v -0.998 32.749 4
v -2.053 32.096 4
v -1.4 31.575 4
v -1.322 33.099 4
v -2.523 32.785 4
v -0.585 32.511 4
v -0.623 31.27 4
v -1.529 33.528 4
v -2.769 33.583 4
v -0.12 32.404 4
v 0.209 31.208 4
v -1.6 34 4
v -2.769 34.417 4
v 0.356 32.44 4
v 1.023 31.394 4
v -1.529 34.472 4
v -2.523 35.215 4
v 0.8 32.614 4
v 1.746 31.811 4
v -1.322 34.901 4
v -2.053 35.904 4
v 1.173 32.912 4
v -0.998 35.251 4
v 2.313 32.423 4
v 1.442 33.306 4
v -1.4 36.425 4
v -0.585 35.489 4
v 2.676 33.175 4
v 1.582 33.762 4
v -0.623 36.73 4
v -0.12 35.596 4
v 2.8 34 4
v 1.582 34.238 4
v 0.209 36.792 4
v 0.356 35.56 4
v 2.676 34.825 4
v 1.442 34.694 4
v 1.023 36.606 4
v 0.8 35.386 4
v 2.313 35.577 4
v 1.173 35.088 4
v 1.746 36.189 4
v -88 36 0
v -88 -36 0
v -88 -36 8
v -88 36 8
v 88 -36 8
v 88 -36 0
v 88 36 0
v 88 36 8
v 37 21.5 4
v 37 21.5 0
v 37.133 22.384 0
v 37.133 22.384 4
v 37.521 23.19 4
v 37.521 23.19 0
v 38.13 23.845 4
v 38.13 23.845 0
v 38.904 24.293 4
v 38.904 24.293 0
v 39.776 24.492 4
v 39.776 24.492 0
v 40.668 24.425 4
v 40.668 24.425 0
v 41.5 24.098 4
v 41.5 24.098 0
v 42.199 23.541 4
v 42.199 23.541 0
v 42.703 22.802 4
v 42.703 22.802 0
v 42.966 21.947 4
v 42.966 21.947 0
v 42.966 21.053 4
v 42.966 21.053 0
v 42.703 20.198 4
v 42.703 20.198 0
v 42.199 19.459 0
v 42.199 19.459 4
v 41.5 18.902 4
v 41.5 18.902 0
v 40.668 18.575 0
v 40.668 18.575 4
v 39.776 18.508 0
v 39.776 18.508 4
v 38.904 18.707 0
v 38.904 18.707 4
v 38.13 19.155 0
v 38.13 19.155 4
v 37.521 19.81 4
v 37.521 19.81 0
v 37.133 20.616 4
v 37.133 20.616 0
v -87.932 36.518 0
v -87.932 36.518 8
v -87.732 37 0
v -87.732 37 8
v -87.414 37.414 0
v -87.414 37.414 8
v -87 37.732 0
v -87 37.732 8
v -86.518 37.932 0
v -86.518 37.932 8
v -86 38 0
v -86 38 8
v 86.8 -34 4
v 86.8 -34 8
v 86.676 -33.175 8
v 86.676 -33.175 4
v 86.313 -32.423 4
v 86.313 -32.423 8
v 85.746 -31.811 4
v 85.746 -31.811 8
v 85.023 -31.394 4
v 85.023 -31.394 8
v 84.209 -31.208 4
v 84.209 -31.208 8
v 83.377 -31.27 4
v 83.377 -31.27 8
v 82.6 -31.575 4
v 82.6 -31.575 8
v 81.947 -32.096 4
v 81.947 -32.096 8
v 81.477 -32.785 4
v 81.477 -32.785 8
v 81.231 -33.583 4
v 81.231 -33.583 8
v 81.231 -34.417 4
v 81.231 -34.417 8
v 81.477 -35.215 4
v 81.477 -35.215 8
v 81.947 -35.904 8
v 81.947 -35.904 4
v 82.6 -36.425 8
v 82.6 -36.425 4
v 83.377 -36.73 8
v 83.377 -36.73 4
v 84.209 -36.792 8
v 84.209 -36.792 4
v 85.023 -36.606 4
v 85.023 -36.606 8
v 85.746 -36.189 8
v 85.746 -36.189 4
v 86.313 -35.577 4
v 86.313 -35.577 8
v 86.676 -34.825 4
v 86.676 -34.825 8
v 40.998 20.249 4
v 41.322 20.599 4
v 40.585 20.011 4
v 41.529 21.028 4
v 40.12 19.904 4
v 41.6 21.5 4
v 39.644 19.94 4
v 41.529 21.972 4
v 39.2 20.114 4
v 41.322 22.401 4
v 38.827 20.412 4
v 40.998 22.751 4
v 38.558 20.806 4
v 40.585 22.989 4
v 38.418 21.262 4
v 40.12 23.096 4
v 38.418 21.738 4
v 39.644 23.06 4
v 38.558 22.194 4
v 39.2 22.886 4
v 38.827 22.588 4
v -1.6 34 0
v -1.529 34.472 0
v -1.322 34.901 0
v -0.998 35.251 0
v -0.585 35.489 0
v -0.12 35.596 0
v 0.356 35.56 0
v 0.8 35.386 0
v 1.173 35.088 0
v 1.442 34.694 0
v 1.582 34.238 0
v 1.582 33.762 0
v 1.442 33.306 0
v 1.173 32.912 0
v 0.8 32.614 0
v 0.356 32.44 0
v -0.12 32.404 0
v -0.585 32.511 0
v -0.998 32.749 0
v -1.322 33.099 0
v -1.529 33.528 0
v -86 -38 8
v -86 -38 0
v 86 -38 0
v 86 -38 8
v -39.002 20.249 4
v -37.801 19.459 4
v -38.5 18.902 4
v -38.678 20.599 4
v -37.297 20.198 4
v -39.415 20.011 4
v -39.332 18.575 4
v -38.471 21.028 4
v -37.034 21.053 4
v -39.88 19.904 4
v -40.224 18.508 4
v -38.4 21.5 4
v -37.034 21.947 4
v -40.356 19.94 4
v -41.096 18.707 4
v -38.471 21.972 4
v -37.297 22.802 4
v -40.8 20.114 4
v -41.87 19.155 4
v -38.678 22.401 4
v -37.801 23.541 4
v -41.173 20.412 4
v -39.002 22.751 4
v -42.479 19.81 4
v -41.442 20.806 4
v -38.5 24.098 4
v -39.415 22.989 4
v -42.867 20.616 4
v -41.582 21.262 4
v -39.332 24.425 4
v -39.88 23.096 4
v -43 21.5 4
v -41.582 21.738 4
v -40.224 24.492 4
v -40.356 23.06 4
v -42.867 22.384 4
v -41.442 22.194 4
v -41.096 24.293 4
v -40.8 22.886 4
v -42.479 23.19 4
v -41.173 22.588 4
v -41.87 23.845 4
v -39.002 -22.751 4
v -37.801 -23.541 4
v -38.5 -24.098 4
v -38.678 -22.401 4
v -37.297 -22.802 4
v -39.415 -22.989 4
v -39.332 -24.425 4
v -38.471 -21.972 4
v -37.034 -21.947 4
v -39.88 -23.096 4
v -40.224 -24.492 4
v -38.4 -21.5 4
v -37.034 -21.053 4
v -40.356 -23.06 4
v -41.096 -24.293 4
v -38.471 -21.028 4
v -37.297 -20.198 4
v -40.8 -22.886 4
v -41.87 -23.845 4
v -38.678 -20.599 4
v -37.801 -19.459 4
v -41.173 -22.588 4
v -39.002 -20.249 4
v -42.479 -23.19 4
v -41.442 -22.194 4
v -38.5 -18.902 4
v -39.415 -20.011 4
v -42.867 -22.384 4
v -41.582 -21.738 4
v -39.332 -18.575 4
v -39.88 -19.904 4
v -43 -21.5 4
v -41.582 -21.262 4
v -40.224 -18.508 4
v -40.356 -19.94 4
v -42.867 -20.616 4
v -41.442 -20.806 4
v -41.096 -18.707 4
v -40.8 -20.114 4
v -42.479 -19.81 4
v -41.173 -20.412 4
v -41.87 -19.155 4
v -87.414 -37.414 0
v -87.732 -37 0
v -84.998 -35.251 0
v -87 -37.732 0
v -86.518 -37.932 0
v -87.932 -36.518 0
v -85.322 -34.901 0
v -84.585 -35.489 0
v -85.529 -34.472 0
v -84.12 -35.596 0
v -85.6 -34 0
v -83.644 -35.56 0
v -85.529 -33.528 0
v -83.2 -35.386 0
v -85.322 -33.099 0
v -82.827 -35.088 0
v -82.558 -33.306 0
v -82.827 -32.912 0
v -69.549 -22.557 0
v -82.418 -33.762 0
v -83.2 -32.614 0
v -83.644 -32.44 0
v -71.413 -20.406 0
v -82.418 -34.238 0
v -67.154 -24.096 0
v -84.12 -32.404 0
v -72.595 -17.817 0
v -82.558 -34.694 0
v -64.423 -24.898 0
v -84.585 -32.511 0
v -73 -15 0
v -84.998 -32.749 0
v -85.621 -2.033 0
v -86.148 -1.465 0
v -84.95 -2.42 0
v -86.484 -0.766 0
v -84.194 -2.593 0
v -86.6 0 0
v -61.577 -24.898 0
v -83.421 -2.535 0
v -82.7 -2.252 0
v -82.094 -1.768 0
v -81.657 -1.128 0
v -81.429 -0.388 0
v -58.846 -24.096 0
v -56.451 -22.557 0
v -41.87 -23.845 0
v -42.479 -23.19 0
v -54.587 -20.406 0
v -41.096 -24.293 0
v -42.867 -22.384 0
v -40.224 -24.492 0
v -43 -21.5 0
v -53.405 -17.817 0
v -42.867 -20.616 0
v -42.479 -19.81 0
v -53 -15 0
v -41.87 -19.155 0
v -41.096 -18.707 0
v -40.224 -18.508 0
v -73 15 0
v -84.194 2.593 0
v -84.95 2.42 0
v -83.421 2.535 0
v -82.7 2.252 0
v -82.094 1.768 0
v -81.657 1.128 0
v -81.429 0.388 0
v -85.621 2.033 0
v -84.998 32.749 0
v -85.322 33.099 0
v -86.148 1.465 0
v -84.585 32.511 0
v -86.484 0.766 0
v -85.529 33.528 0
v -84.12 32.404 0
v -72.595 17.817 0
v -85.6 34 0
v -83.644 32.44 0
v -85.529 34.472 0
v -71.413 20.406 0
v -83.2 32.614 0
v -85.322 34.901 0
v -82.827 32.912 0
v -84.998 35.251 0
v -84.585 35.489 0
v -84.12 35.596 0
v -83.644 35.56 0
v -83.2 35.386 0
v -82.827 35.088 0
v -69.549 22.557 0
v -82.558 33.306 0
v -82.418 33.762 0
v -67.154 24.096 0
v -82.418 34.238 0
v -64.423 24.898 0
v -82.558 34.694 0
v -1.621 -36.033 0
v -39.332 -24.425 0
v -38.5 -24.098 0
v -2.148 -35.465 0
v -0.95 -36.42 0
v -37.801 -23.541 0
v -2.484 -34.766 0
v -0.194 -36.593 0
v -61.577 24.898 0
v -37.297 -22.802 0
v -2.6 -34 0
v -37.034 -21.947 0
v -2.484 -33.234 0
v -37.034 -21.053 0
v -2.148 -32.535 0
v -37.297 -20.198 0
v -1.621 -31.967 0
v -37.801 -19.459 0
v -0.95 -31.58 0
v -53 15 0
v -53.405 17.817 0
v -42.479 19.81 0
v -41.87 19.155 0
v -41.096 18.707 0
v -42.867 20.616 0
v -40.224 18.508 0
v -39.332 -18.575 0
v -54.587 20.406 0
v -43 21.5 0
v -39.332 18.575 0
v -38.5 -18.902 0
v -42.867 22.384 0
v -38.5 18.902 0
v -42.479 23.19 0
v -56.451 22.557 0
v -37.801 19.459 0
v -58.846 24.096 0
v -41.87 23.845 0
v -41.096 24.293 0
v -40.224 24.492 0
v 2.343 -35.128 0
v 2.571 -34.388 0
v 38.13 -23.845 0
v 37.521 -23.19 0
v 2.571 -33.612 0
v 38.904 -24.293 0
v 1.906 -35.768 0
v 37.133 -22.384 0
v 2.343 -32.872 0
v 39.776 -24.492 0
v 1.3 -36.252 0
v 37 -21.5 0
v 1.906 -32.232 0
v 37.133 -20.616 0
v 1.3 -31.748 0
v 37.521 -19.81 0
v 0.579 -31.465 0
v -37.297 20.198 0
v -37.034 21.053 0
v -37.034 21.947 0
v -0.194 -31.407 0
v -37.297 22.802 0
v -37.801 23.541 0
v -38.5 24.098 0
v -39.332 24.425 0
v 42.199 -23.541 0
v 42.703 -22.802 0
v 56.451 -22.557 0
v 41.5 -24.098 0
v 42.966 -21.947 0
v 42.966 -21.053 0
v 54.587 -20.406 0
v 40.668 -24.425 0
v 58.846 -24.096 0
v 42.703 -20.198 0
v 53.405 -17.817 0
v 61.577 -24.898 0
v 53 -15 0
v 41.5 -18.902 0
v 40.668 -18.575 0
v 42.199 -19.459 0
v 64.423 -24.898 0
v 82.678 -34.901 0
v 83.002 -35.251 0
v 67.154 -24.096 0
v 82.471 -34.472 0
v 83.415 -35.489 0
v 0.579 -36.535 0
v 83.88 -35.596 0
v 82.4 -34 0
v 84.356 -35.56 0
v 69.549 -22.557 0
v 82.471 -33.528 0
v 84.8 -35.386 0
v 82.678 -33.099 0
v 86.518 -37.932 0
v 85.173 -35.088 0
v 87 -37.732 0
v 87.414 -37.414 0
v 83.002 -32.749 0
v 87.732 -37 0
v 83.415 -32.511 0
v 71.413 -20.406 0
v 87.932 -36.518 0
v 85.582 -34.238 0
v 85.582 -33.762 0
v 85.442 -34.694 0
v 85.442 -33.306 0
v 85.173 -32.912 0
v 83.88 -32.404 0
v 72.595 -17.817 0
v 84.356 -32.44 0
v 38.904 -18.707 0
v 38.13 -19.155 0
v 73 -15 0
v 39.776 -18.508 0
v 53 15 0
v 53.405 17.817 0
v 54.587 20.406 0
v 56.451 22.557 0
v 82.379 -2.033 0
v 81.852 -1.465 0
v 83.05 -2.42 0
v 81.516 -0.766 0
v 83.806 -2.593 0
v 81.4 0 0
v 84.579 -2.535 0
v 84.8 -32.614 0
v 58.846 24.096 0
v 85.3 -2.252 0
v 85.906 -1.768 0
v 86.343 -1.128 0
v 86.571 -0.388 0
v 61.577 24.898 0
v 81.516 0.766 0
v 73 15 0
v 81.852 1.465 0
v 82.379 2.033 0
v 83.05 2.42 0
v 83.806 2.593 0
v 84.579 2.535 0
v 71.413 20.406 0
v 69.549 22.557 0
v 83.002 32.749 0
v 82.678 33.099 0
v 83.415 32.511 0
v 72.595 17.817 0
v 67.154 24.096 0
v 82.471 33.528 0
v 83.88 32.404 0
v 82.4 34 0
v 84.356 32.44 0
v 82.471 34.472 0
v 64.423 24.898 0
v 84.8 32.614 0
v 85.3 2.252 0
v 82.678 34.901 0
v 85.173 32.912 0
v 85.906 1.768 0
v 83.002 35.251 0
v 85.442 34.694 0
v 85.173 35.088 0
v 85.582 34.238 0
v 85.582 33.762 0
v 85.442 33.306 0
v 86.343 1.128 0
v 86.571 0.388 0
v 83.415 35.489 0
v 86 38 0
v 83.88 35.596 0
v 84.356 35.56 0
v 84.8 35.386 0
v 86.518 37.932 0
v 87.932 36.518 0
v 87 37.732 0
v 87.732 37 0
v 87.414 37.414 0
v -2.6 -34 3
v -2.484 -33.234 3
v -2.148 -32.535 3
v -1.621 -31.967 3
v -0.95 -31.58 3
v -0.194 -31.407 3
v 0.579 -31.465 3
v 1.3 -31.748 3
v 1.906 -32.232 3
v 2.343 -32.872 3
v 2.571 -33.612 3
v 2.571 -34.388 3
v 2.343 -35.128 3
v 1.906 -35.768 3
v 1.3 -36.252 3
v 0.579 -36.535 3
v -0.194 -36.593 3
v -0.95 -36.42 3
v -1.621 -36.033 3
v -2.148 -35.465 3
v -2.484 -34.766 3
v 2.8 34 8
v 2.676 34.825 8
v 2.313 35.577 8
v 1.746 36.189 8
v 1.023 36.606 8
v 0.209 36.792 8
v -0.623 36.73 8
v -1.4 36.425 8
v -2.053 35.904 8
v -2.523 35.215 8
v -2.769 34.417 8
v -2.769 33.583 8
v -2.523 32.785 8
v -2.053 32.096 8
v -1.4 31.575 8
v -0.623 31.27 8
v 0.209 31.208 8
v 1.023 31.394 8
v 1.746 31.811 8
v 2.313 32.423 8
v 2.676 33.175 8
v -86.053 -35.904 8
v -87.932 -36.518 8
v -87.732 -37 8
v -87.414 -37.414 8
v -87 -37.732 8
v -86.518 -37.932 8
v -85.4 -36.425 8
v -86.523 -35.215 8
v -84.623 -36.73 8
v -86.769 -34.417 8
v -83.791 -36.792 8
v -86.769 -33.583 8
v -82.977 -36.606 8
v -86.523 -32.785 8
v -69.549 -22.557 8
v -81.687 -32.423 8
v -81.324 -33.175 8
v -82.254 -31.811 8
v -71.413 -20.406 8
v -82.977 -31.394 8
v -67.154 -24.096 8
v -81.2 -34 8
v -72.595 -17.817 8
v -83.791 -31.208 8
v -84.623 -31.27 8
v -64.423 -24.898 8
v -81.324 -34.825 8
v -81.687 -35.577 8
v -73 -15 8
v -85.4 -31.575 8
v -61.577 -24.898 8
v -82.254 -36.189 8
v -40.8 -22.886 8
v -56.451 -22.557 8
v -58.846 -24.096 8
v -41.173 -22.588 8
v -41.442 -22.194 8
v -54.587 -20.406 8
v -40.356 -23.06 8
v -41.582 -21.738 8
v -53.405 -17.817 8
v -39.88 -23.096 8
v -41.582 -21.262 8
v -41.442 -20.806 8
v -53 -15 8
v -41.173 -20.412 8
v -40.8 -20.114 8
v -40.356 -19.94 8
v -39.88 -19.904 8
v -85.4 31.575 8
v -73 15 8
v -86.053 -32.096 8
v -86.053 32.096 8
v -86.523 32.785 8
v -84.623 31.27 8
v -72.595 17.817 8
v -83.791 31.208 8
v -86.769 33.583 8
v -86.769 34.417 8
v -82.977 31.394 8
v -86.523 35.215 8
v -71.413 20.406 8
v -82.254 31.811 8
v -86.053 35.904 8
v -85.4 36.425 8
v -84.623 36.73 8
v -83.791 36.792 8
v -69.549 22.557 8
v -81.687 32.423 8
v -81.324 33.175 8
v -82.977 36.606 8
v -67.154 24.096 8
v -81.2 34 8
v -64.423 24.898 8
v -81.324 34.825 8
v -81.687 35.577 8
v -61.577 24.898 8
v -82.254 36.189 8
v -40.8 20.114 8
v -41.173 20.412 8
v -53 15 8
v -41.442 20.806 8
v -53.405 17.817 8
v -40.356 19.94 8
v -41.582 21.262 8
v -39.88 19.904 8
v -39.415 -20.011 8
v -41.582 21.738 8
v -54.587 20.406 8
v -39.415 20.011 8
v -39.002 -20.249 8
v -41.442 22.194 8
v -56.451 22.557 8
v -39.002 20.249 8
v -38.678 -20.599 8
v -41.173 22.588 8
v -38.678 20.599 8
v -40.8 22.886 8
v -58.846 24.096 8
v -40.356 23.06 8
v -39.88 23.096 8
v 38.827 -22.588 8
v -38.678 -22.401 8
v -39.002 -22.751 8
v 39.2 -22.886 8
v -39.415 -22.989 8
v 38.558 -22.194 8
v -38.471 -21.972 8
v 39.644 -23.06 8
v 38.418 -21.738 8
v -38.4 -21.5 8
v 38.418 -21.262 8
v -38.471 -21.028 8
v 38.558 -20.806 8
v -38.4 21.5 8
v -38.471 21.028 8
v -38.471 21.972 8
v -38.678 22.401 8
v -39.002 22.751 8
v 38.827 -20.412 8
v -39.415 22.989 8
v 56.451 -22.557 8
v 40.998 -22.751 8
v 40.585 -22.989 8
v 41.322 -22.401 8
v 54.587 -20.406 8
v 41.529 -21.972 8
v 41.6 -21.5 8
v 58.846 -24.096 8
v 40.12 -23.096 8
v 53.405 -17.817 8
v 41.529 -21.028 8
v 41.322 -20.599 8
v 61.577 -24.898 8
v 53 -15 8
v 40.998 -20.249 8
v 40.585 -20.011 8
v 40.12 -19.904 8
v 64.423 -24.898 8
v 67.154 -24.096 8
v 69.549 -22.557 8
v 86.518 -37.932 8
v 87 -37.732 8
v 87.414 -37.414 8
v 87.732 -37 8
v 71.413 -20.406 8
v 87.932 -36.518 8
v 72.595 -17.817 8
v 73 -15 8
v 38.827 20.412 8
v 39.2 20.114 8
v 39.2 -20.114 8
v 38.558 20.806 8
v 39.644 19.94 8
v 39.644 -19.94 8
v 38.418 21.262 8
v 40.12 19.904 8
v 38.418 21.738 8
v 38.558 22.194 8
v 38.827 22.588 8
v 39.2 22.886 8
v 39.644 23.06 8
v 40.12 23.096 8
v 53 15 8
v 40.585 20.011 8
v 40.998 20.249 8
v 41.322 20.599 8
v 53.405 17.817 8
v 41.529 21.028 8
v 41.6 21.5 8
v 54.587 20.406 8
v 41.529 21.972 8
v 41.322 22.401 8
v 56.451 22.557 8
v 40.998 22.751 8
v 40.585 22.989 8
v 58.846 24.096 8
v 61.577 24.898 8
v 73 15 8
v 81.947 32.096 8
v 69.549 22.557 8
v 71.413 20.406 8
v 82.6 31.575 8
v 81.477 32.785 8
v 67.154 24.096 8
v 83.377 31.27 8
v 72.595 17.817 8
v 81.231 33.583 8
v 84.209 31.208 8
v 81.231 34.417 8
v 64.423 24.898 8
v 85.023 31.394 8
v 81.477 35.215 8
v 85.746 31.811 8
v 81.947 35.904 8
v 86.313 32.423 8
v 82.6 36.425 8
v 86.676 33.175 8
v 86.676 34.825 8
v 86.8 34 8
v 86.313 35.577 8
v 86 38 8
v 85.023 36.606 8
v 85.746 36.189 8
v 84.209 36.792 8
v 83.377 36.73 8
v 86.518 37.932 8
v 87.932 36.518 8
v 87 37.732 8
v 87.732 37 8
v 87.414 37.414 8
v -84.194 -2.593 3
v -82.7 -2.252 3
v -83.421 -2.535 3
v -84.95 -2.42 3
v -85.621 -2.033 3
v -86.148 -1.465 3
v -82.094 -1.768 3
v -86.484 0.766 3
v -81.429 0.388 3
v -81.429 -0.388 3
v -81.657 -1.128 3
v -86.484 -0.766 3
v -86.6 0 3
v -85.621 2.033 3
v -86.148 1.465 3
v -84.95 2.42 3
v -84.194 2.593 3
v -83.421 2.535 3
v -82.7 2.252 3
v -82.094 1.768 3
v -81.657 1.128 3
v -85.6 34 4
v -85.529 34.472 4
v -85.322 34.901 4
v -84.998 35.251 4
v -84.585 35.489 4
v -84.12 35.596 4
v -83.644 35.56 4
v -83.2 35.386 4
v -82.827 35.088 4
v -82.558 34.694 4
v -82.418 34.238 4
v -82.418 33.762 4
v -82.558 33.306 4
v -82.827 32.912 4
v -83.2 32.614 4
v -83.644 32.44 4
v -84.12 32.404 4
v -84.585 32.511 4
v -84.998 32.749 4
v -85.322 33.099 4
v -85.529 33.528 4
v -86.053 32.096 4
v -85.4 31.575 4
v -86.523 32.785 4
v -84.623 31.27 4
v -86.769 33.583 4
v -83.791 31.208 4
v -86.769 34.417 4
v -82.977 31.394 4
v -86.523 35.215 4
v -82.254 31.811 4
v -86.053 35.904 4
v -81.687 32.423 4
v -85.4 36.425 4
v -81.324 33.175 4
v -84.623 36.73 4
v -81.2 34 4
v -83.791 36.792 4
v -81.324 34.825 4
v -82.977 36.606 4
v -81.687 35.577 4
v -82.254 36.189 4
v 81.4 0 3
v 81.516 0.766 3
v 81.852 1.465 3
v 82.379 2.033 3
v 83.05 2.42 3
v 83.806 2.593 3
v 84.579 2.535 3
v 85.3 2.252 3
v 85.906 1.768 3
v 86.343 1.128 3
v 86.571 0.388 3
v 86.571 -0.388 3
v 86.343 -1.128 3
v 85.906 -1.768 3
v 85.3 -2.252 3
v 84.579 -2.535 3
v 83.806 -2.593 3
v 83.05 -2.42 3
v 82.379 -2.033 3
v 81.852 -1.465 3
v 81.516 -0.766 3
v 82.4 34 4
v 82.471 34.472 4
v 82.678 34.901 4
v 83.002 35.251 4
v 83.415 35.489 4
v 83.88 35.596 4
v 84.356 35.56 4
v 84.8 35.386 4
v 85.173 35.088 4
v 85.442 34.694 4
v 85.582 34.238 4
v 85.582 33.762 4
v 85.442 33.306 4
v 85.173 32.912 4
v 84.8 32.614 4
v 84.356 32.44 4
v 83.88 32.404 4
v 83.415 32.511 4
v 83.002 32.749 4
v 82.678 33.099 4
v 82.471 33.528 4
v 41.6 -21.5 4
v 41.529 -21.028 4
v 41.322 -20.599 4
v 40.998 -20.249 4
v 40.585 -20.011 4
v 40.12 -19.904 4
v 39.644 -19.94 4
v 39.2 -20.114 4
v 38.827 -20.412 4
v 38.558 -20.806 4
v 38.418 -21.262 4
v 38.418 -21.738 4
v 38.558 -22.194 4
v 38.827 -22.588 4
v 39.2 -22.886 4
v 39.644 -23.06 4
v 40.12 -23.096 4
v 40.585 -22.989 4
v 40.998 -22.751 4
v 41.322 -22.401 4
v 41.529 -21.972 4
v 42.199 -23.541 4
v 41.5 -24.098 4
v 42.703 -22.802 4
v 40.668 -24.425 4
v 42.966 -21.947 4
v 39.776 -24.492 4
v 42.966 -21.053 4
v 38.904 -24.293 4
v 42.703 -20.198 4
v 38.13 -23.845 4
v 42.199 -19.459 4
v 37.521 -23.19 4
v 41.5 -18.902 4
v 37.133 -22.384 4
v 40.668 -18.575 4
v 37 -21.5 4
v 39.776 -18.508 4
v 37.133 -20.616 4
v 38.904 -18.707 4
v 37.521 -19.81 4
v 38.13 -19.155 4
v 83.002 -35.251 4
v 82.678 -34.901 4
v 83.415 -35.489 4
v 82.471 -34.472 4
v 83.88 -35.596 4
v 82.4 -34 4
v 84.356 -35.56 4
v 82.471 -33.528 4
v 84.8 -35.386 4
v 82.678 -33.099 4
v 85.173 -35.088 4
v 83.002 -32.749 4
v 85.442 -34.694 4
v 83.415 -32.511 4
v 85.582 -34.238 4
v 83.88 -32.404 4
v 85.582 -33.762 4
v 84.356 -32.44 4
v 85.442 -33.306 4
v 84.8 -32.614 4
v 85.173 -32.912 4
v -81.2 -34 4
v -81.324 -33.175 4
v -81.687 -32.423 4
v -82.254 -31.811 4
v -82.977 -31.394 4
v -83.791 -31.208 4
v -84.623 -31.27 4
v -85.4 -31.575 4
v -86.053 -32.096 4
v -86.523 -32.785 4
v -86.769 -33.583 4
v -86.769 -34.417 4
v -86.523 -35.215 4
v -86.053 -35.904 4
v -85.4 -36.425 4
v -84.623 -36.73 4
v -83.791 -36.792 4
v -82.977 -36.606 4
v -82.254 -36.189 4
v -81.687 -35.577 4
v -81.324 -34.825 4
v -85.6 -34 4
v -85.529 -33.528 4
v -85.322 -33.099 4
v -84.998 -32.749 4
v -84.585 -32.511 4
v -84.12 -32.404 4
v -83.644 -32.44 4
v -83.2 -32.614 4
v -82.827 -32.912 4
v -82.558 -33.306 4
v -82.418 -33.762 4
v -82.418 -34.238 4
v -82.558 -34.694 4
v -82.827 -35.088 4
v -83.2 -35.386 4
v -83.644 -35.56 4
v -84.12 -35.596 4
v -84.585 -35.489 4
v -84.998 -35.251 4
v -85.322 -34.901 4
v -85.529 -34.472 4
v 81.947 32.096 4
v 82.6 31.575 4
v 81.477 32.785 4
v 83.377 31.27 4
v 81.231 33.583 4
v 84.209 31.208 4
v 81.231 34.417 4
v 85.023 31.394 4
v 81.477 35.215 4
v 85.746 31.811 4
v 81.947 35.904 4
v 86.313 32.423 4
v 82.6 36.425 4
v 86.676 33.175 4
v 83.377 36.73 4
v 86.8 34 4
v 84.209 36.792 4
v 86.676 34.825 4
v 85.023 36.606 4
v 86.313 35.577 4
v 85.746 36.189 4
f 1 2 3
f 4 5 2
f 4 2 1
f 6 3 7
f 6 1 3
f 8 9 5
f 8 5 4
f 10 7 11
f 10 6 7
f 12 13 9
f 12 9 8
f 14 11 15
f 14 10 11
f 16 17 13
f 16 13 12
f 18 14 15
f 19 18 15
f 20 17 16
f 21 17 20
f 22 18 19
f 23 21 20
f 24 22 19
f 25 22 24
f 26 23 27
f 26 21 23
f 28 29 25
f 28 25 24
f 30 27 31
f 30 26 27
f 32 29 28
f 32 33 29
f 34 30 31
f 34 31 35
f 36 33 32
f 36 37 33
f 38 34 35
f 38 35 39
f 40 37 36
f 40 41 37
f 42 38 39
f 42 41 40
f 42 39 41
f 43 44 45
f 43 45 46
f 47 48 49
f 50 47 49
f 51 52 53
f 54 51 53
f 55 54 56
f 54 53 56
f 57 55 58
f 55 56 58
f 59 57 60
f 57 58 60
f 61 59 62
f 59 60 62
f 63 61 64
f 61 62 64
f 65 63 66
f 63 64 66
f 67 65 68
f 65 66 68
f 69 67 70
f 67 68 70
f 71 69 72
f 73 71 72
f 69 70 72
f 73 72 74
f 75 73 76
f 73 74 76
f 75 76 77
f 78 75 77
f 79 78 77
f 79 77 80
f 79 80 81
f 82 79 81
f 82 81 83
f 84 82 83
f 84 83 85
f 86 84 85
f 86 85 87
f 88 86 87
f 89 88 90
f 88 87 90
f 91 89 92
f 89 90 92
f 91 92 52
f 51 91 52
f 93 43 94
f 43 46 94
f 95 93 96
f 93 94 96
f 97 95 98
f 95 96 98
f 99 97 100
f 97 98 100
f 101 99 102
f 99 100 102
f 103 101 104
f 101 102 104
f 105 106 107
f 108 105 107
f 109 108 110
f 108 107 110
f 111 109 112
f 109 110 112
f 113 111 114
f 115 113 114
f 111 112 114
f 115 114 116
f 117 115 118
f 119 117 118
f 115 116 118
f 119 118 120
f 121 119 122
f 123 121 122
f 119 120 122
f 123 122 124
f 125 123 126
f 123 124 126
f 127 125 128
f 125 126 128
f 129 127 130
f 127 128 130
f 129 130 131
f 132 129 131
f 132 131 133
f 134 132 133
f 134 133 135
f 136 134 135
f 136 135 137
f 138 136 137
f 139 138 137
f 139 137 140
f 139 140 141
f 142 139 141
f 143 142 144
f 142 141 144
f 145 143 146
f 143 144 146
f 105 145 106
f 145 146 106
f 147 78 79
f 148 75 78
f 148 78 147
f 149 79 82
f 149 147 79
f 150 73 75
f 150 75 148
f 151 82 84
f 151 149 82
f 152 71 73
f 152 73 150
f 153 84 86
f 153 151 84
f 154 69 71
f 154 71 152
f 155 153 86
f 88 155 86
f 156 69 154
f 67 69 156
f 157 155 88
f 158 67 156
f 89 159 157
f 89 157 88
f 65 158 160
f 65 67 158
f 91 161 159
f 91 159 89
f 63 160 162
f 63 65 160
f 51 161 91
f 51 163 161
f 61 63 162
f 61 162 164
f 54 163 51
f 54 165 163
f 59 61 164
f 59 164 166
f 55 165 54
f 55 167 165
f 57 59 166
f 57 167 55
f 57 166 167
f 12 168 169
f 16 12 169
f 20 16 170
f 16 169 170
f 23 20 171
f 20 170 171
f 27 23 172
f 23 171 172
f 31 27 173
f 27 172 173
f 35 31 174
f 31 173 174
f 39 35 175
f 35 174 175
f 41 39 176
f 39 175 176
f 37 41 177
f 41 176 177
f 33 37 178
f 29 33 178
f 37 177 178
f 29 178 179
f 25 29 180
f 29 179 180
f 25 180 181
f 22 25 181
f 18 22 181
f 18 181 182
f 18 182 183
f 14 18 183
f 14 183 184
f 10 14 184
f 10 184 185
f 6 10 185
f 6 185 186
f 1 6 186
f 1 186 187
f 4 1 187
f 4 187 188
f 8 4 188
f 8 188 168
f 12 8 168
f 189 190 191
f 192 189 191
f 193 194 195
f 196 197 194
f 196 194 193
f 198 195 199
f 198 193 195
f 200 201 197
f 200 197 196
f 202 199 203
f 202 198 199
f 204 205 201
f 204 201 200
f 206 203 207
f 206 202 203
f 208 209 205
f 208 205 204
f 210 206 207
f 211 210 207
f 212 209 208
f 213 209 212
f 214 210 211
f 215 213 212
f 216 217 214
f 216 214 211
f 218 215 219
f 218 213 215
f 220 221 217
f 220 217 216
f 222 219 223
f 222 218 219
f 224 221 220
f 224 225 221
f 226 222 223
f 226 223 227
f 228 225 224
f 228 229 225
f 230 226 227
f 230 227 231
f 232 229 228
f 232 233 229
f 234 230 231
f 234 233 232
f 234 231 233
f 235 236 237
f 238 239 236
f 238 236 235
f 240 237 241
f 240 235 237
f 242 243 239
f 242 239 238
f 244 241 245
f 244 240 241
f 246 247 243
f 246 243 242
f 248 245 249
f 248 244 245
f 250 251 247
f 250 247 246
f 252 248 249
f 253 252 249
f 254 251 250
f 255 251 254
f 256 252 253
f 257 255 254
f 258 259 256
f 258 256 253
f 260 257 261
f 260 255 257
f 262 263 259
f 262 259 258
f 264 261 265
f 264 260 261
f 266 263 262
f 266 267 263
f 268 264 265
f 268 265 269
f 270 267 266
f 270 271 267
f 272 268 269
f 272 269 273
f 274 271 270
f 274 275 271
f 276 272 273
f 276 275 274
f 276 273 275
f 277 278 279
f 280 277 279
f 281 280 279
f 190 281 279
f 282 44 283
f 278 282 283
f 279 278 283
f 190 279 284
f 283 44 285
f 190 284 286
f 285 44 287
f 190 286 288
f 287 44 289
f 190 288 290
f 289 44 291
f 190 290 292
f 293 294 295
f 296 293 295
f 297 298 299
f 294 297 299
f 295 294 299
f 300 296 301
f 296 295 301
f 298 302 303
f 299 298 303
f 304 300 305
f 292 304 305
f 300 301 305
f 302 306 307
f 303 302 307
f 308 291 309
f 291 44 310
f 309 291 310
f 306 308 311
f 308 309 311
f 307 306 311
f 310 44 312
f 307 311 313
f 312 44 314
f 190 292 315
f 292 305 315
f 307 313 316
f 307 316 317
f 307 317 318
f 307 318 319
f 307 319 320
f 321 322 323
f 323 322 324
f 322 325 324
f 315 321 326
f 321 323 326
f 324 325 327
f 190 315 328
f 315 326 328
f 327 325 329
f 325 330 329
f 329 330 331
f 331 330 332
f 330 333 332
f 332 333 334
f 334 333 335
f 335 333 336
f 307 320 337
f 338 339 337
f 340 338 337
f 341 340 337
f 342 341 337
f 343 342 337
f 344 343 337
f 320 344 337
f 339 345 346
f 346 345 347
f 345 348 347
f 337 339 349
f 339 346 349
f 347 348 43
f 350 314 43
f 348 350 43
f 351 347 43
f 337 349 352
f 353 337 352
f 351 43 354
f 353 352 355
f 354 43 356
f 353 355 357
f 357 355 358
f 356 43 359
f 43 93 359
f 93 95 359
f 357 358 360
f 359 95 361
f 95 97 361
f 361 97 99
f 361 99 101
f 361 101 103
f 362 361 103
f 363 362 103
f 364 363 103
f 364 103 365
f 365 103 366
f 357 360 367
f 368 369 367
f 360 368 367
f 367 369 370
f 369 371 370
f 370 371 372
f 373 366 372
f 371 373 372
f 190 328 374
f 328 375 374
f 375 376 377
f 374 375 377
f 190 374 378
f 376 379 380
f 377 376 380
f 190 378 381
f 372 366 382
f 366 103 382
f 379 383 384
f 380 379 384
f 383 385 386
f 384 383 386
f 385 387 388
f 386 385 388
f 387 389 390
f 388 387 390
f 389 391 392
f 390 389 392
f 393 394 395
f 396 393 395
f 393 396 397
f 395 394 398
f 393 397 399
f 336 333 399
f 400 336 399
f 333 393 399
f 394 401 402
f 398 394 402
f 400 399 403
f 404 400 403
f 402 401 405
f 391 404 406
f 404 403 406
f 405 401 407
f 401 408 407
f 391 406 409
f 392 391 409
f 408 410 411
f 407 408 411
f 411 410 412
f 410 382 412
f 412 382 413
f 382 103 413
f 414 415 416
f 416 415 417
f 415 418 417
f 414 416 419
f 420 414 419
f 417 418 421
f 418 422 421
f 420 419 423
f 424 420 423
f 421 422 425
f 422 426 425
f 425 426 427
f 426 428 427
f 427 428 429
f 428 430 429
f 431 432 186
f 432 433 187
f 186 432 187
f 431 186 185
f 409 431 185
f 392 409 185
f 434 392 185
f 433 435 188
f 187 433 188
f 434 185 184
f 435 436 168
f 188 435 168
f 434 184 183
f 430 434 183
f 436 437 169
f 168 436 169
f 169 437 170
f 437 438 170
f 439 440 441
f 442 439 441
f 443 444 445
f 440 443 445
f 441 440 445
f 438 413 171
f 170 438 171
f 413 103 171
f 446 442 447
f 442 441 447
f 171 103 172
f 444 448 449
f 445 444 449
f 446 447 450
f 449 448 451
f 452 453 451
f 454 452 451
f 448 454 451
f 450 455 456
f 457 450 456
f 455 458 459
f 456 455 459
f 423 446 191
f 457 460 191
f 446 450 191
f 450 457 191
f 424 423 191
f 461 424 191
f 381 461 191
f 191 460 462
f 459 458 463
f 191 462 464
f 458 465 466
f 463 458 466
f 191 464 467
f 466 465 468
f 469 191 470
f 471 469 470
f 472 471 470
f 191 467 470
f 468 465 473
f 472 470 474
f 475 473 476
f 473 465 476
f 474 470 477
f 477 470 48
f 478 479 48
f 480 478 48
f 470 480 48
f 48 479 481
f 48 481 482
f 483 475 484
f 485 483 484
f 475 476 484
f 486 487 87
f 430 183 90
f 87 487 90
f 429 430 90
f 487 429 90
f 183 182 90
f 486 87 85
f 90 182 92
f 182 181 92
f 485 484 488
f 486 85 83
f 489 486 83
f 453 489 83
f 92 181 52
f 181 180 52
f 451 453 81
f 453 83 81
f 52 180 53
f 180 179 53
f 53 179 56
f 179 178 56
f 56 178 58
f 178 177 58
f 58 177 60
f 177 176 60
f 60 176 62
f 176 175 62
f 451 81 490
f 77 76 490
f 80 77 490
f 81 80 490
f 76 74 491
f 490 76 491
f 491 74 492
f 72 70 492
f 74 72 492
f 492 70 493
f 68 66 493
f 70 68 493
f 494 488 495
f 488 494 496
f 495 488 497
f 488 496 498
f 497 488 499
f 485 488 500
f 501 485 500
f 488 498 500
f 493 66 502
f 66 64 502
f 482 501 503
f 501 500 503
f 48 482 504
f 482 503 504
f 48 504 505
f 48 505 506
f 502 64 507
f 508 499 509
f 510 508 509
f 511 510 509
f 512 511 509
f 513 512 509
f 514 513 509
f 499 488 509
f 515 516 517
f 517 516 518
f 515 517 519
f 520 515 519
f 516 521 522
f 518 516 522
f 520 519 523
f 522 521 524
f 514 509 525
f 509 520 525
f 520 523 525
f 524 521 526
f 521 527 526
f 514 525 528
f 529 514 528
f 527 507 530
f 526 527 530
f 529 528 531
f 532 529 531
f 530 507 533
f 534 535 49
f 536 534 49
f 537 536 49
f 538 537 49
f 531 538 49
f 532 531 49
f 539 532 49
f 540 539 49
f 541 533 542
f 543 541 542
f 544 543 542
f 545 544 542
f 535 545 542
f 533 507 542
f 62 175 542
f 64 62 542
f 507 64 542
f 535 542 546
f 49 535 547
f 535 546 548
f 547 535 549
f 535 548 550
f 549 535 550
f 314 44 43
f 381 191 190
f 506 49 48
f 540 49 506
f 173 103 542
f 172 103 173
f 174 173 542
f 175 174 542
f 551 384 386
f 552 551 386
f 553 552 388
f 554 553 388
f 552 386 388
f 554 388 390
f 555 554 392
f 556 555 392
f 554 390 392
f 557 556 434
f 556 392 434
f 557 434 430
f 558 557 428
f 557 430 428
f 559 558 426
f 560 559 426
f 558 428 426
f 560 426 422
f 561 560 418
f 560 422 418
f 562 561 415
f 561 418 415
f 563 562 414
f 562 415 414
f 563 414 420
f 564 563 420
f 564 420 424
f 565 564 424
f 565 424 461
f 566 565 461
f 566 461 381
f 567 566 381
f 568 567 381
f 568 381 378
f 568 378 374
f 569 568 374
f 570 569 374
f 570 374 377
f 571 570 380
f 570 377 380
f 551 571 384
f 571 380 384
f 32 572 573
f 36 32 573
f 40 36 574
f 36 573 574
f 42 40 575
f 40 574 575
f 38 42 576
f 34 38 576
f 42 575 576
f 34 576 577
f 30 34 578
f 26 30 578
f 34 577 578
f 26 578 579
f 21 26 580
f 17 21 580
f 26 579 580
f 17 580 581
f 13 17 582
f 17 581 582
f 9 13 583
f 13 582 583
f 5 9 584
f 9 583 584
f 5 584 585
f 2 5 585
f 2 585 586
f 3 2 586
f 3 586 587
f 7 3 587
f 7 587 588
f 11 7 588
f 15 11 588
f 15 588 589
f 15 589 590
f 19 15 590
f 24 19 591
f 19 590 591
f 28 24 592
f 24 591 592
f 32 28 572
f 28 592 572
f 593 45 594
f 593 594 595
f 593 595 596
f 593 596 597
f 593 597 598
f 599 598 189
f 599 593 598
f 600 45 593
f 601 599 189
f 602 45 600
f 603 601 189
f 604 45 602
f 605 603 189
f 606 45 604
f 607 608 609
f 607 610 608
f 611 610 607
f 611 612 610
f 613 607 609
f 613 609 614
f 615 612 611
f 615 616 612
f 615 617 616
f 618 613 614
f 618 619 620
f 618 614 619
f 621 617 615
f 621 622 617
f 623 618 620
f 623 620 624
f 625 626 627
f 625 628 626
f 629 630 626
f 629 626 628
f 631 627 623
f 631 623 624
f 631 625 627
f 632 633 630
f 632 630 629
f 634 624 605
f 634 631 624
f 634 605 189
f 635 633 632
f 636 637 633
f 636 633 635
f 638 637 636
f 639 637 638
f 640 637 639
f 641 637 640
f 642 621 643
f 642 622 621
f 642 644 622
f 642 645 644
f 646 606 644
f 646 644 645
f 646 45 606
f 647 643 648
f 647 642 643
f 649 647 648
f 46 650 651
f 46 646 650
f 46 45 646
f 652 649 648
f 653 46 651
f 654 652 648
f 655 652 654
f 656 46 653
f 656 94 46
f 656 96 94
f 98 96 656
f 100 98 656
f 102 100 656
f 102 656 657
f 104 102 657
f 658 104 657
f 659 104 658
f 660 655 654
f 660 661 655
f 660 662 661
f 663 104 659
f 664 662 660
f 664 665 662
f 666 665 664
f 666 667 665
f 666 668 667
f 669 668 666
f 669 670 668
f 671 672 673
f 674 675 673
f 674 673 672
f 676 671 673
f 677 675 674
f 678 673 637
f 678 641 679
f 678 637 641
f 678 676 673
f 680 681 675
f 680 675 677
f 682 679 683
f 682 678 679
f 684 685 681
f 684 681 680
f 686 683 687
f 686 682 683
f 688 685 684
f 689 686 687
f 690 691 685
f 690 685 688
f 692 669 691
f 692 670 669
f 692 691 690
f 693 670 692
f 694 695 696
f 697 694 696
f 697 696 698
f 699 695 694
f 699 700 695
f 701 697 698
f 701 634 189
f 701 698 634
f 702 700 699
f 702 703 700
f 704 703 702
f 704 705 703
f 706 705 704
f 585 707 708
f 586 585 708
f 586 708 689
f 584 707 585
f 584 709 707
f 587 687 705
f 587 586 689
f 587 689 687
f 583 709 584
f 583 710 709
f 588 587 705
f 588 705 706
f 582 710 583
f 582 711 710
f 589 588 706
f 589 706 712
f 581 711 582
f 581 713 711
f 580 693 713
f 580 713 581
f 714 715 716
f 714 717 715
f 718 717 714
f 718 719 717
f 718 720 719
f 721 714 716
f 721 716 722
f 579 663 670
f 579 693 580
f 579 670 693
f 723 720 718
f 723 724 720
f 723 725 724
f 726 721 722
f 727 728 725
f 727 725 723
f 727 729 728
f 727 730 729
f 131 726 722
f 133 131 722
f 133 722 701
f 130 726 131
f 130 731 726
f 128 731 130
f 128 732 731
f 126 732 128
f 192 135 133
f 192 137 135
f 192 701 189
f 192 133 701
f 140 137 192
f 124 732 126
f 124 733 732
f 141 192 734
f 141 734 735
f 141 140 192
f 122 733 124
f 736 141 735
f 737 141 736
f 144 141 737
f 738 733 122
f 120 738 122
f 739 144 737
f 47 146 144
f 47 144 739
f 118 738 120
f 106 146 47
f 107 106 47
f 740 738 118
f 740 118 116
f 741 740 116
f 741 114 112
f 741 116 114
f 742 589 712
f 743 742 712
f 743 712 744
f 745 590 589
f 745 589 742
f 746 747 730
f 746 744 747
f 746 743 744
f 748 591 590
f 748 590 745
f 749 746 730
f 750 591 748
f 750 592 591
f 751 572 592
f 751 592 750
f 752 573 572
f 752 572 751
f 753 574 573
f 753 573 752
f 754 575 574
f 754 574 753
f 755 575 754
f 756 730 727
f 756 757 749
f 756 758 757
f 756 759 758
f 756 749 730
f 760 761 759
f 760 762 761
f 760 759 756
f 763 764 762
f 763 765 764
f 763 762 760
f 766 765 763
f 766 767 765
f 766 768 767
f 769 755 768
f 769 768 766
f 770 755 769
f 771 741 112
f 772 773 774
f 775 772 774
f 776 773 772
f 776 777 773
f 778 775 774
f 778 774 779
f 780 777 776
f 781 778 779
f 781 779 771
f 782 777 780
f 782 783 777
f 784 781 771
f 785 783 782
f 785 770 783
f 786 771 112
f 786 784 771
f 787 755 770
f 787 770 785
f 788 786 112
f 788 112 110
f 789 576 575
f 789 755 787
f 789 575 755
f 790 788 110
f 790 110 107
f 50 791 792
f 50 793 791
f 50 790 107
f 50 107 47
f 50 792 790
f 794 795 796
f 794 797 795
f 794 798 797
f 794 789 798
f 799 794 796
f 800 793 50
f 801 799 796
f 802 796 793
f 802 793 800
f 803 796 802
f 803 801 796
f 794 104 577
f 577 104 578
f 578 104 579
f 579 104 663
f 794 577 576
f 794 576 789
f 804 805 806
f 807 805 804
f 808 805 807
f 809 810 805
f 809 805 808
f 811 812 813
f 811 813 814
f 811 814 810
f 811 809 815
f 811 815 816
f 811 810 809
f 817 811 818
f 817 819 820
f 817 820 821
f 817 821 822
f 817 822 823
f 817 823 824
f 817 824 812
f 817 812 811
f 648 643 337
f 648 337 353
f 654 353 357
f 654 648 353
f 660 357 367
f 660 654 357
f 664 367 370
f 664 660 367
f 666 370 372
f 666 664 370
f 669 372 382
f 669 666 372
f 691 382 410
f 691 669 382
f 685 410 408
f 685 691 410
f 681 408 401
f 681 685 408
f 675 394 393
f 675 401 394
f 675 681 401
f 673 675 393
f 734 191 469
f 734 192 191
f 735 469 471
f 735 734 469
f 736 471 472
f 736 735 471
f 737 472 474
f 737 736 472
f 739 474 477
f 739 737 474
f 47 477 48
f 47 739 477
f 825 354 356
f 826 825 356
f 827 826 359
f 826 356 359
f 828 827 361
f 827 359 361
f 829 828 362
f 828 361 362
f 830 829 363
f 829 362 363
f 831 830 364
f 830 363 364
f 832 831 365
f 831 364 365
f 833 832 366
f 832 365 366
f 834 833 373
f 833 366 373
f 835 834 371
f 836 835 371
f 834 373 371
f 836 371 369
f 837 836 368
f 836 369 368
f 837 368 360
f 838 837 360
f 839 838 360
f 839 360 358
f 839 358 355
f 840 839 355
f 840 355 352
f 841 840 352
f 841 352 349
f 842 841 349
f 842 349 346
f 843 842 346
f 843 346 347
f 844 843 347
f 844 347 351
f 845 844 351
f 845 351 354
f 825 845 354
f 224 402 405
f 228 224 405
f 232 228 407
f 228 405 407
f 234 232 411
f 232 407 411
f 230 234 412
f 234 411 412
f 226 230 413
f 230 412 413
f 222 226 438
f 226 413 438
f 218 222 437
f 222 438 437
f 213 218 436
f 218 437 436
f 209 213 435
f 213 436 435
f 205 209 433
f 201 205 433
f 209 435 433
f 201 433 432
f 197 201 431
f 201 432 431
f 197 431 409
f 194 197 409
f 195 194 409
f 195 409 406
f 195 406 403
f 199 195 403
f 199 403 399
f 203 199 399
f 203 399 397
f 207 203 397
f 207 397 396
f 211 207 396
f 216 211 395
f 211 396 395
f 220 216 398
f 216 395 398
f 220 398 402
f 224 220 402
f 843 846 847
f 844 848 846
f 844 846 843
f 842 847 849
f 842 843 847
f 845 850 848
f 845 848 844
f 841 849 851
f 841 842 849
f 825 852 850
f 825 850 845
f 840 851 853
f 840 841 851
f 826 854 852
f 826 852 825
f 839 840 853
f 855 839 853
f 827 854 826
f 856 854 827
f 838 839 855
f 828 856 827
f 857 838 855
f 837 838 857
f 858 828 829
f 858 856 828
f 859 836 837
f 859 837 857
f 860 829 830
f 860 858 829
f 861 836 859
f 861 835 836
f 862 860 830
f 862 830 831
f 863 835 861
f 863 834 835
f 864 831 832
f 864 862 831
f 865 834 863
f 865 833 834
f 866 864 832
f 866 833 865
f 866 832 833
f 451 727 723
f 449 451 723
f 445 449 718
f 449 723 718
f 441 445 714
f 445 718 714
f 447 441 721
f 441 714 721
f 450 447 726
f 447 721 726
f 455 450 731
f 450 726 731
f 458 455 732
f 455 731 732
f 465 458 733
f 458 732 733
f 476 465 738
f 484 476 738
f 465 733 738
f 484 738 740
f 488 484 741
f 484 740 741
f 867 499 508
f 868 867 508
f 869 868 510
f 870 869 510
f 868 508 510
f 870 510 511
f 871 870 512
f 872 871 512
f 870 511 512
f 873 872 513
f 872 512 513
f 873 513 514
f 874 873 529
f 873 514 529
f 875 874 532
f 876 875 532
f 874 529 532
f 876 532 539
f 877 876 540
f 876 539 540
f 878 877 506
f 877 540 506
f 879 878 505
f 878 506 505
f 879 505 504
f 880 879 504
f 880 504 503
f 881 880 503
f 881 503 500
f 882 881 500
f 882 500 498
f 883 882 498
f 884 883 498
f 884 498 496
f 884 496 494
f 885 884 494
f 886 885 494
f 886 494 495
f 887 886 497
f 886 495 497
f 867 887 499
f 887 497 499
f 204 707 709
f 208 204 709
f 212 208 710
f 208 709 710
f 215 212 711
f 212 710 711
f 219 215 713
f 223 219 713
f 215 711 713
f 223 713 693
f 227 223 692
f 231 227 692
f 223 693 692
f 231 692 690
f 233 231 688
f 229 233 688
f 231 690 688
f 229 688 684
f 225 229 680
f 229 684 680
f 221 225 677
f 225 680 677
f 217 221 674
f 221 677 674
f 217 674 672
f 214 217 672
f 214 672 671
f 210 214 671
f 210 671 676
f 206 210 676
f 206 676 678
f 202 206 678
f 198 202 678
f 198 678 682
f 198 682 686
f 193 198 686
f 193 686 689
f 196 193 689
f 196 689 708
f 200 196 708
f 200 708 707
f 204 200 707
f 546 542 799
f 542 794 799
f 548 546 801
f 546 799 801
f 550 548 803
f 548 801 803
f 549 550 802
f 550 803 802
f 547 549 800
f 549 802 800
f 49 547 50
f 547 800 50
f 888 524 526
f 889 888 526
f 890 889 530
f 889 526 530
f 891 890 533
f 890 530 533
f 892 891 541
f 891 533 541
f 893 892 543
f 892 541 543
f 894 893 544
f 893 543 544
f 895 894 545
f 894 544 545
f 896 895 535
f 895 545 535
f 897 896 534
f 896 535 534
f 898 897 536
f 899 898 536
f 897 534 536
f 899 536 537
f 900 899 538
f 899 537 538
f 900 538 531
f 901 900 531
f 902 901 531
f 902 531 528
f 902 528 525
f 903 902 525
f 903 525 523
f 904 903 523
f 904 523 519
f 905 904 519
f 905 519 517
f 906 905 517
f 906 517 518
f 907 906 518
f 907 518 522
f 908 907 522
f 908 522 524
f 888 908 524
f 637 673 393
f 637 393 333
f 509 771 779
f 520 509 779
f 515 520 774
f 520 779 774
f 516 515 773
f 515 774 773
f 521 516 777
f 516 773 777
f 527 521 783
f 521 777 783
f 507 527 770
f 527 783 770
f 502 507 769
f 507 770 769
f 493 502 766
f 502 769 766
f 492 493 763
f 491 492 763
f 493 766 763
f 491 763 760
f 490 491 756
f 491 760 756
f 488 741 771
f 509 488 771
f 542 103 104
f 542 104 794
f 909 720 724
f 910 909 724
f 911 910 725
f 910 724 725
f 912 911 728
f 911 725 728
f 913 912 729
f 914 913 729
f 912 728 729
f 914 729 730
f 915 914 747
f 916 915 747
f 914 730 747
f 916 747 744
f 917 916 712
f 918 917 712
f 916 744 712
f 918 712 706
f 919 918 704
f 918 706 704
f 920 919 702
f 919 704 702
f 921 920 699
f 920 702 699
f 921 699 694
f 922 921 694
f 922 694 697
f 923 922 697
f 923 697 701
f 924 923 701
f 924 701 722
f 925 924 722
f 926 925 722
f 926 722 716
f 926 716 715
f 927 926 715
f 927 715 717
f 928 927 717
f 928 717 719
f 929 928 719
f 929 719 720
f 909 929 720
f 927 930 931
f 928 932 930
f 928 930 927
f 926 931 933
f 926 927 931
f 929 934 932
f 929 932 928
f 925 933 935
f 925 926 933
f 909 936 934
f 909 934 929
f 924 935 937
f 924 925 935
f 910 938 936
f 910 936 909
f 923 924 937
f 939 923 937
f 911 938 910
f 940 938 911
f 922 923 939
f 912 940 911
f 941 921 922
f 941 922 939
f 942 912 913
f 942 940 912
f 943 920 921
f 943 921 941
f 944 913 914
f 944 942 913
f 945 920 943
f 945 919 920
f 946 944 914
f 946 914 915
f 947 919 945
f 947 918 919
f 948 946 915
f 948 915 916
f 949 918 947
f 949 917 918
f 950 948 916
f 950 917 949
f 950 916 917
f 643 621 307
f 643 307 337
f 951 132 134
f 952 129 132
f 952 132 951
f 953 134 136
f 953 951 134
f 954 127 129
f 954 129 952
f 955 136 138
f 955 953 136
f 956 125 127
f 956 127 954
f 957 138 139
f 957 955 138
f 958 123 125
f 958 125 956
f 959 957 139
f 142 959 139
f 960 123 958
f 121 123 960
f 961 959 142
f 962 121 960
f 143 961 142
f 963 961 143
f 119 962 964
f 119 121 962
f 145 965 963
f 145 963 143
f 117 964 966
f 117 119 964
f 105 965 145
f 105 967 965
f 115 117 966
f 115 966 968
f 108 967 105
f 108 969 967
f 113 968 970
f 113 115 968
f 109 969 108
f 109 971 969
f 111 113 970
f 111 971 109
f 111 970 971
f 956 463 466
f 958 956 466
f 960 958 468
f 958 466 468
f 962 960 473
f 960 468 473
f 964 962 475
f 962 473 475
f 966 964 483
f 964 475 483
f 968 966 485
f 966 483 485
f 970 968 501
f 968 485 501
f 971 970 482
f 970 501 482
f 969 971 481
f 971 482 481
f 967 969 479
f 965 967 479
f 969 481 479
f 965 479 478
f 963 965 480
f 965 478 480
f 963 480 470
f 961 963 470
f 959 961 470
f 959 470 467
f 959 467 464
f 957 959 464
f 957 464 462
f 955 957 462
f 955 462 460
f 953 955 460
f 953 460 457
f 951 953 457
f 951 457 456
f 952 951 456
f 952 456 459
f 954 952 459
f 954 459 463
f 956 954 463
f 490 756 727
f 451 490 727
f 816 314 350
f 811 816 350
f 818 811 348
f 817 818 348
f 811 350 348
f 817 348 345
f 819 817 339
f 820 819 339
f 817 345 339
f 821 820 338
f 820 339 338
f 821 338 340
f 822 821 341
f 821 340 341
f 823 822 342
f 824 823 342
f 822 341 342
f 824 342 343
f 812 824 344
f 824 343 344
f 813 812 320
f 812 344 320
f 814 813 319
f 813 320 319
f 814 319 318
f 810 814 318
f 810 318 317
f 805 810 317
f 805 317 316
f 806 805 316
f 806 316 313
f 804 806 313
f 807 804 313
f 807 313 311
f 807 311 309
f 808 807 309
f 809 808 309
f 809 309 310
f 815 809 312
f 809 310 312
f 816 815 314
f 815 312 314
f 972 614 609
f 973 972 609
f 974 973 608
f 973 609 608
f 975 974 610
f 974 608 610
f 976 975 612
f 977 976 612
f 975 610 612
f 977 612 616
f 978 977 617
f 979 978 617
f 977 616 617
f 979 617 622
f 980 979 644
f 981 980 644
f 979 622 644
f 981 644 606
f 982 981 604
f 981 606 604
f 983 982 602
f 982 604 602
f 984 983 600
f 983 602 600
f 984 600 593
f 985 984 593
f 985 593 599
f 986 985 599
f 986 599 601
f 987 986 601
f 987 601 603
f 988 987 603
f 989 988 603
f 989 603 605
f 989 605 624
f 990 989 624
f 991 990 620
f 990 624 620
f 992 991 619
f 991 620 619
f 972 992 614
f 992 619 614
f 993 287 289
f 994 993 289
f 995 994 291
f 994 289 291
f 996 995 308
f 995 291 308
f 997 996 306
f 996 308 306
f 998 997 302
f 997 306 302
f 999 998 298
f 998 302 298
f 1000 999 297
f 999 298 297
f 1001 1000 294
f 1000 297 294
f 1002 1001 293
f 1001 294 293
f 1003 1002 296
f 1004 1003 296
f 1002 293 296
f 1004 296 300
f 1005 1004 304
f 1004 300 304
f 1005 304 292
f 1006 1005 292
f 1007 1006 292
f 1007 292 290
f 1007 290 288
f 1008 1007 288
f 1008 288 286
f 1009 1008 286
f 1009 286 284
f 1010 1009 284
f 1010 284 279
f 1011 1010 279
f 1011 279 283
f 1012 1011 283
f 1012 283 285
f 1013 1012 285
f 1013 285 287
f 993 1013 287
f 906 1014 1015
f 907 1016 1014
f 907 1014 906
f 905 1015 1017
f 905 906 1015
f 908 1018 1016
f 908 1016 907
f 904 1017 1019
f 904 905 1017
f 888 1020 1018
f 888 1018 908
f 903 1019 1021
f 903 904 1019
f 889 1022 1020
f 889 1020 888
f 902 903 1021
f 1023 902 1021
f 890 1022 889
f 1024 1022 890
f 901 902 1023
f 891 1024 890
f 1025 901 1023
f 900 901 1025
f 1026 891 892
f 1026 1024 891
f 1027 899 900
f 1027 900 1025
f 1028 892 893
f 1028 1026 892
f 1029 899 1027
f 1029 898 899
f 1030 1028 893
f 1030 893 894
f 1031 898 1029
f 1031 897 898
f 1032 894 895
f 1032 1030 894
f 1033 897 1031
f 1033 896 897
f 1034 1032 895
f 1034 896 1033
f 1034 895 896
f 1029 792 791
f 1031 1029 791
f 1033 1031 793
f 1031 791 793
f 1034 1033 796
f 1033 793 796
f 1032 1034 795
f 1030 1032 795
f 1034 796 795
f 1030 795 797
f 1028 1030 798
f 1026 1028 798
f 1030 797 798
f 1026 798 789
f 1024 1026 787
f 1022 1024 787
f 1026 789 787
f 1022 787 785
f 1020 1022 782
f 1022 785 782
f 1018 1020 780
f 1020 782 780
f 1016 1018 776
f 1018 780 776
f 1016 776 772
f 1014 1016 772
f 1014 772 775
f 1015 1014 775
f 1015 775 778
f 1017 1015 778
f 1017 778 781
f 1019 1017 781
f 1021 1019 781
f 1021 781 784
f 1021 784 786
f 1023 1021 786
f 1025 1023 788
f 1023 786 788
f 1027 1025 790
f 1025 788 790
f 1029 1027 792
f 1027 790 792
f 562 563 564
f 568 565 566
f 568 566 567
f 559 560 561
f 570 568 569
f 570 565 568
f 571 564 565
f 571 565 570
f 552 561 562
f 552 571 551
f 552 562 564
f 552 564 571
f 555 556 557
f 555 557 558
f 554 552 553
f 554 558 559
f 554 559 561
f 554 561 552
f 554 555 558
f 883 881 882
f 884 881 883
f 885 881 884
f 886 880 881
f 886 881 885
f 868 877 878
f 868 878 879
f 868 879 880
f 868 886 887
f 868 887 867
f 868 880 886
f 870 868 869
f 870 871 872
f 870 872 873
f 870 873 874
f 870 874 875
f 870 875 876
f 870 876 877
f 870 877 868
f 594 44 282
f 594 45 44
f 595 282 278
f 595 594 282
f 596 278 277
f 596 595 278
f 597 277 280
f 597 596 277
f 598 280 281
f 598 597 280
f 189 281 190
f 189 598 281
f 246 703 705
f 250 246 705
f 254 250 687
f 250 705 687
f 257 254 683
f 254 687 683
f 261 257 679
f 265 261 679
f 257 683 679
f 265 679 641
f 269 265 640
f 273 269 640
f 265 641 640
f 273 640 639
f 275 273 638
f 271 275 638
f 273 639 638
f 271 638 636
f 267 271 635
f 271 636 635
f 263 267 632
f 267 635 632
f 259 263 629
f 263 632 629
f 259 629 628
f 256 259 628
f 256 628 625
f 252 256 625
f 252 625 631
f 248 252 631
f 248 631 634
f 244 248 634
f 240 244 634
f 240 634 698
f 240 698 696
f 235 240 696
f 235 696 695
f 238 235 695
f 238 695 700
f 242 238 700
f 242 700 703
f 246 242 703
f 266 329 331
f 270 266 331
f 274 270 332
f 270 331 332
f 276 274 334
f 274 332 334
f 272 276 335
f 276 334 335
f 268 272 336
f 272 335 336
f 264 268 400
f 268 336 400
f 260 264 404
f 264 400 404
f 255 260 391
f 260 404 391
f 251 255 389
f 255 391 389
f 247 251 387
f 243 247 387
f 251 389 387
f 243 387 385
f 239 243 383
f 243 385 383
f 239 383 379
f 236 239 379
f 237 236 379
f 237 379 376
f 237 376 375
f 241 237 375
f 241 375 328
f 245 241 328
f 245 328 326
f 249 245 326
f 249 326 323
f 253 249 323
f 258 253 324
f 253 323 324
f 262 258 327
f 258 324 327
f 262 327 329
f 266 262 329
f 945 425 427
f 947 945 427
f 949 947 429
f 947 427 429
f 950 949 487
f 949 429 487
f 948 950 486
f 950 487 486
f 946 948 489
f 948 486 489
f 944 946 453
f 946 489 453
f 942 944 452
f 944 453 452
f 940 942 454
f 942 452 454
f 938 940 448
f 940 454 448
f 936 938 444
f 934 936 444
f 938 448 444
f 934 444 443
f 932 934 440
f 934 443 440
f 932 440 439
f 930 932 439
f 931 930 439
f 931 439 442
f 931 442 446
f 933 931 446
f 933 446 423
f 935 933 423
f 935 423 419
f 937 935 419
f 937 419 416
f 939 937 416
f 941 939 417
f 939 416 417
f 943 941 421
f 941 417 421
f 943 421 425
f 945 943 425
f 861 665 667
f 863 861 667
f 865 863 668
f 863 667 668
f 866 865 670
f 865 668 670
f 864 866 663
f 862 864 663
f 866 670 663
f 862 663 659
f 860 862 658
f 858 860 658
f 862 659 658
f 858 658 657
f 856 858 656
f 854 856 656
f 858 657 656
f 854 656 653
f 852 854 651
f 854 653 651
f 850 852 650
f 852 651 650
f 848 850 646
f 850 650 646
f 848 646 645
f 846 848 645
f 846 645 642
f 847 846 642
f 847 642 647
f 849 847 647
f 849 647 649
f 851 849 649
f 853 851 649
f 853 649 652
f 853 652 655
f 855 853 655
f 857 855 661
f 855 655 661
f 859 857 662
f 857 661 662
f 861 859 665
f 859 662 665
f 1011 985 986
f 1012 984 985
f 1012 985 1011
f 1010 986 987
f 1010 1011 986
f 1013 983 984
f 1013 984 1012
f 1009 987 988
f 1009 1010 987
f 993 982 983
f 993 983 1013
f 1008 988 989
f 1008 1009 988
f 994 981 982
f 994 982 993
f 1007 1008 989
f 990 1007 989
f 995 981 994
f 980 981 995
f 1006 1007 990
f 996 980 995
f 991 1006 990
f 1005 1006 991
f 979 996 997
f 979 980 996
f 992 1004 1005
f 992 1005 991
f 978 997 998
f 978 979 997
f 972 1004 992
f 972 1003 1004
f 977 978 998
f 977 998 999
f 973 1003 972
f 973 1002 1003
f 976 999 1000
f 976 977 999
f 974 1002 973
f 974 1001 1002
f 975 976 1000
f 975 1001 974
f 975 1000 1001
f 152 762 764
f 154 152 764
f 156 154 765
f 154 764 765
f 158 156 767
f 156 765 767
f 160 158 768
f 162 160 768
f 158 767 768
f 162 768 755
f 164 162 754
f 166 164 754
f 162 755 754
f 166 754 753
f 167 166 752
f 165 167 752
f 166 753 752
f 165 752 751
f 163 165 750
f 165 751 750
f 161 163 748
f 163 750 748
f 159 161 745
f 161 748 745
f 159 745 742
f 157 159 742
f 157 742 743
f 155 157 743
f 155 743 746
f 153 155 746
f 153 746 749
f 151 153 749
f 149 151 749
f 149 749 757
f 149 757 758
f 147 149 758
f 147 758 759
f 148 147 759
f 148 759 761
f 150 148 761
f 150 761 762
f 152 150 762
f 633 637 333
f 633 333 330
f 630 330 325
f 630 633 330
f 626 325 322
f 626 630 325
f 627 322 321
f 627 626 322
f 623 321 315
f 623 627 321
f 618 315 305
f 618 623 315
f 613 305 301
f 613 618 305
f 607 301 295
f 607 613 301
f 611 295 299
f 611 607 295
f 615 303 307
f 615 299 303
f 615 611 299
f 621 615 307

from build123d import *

# Parameters (mm, degrees)
SKETCH_1_W          = 176
SKETCH_1_H          = 76
EXTRUDE_1_DEPTH     = 8
SKETCH_2_R          = 1.6
CUT_EXTRUDE_1_DEPTH = 9
SKETCH_2_3_R        = 2.6
CUT_EXTRUDE_2_DEPTH = 3
SKETCH_4_R          = 2.8
CUT_EXTRUDE_3_DEPTH = 4
FILLET_1_R          = 2
SKETCH1_R           = 1.6
CUT_EXTRUDE1_DEPTH  = 9
SKETCH2_R           = 3
CUT_EXTRUDE2_DEPTH  = 4
CUT_EXTRUDE3_DEPTH  = 9


with BuildPart() as part:
    # 草图1 → 凸台-拉伸1 (new body)
    with BuildSketch(Plane.XY):
        Rectangle(SKETCH_1_W, SKETCH_1_H)
    extrude(amount=EXTRUDE_1_DEPTH)

    # 草图2 → 切除-拉伸1 (cut, through all)
    with BuildSketch(Plane(origin=(0, 0, 0), x_dir=(-1, 0, 0), z_dir=(0, 0, -1))):
        with Locations((-84, 34)):
            Circle(SKETCH_2_R)
        with Locations((0, 34)):
            Circle(SKETCH_2_R)
        with Locations((84, 34)):
            Circle(SKETCH_2_R)
        with Locations((-84, -34)):
            Circle(SKETCH_2_R)
        with Locations((84, -34)):
            Circle(SKETCH_2_R)
    extrude(amount=-CUT_EXTRUDE_1_DEPTH, mode=Mode.SUBTRACT)

    # 草图2<3> → 切除-拉伸2 (cut)
    with BuildSketch(Plane(origin=(0, 0, 0), x_dir=(-1, 0, 0), z_dir=(0, 0, -1))):
        with Locations((-84, 0)):
            Circle(SKETCH_2_3_R)
        with Locations((84, 0)):
            Circle(SKETCH_2_3_R)
        with Locations((0, -34)):
            Circle(SKETCH_2_3_R)
    extrude(amount=-CUT_EXTRUDE_2_DEPTH, mode=Mode.SUBTRACT)

    # 草图4 → 切除-拉伸3 (cut)
    with BuildSketch(Plane.XY.offset(8)):
        with Locations((-84, 34)):
            Circle(SKETCH_4_R)
        with Locations((0, 34)):
            Circle(SKETCH_4_R)
        with Locations((-84, -34)):
            Circle(SKETCH_4_R)
        with Locations((84, 34)):
            Circle(SKETCH_4_R)
        with Locations((84, -34)):
            Circle(SKETCH_4_R)
    extrude(amount=-CUT_EXTRUDE_3_DEPTH, mode=Mode.SUBTRACT)

    # 圆角1
    fillet_1_edges = [part.edges().sort_by_distance(p)[0] for p in [
        (-88, 38, 4),
        (88, 38, 4),
        (88, -38, 4),
        (-88, -38, 4),
    ]]
    fillet(fillet_1_edges, radius=FILLET_1_R)

    # Sketch1 → Cut-Extrude1 (cut, through all)
    with BuildSketch(Plane.XY.offset(8)):
        with Locations((-40, 21.5)):
            Circle(SKETCH1_R)
        with Locations((40, 21.5)):
            Circle(SKETCH1_R)
        with Locations((40, -21.5)):
            Circle(SKETCH1_R)
        with Locations((-40, -21.5)):
            Circle(SKETCH1_R)
    extrude(amount=-CUT_EXTRUDE1_DEPTH, mode=Mode.SUBTRACT)

    # Sketch2 → Cut-Extrude2 (cut)
    with BuildSketch(Plane(origin=(0, 0, 0), x_dir=(-1, 0, 0), z_dir=(0, 0, -1))):
        with Locations((-40, 21.5)):
            Circle(SKETCH2_R)
        with Locations((40, 21.5)):
            Circle(SKETCH2_R)
        with Locations((40, -21.5)):
            Circle(SKETCH2_R)
        with Locations((-40, -21.5)):
            Circle(SKETCH2_R)
    extrude(amount=-CUT_EXTRUDE2_DEPTH, mode=Mode.SUBTRACT)

    # Sketch3 → Cut-Extrude3 (cut, through all)
    with BuildSketch(Plane.XY.offset(8)):
        with BuildLine():
            Line((-73, -15), (-73, 15))
            ThreePointArc((-73, 15), (-63, 25), (-53, 15))
            Line((-53, 15), (-53, -15))
            ThreePointArc((-53, -15), (-63, -25), (-73, -15))
        make_face()
        with BuildLine():
            Line((73, -15), (73, 15))
            ThreePointArc((73, 15), (63, 25), (53, 15))
            Line((53, 15), (53, -15))
            ThreePointArc((53, -15), (63, -25), (73, -15))
        make_face()
    extrude(amount=-CUT_EXTRUDE3_DEPTH, mode=Mode.SUBTRACT)


solid = part.part
